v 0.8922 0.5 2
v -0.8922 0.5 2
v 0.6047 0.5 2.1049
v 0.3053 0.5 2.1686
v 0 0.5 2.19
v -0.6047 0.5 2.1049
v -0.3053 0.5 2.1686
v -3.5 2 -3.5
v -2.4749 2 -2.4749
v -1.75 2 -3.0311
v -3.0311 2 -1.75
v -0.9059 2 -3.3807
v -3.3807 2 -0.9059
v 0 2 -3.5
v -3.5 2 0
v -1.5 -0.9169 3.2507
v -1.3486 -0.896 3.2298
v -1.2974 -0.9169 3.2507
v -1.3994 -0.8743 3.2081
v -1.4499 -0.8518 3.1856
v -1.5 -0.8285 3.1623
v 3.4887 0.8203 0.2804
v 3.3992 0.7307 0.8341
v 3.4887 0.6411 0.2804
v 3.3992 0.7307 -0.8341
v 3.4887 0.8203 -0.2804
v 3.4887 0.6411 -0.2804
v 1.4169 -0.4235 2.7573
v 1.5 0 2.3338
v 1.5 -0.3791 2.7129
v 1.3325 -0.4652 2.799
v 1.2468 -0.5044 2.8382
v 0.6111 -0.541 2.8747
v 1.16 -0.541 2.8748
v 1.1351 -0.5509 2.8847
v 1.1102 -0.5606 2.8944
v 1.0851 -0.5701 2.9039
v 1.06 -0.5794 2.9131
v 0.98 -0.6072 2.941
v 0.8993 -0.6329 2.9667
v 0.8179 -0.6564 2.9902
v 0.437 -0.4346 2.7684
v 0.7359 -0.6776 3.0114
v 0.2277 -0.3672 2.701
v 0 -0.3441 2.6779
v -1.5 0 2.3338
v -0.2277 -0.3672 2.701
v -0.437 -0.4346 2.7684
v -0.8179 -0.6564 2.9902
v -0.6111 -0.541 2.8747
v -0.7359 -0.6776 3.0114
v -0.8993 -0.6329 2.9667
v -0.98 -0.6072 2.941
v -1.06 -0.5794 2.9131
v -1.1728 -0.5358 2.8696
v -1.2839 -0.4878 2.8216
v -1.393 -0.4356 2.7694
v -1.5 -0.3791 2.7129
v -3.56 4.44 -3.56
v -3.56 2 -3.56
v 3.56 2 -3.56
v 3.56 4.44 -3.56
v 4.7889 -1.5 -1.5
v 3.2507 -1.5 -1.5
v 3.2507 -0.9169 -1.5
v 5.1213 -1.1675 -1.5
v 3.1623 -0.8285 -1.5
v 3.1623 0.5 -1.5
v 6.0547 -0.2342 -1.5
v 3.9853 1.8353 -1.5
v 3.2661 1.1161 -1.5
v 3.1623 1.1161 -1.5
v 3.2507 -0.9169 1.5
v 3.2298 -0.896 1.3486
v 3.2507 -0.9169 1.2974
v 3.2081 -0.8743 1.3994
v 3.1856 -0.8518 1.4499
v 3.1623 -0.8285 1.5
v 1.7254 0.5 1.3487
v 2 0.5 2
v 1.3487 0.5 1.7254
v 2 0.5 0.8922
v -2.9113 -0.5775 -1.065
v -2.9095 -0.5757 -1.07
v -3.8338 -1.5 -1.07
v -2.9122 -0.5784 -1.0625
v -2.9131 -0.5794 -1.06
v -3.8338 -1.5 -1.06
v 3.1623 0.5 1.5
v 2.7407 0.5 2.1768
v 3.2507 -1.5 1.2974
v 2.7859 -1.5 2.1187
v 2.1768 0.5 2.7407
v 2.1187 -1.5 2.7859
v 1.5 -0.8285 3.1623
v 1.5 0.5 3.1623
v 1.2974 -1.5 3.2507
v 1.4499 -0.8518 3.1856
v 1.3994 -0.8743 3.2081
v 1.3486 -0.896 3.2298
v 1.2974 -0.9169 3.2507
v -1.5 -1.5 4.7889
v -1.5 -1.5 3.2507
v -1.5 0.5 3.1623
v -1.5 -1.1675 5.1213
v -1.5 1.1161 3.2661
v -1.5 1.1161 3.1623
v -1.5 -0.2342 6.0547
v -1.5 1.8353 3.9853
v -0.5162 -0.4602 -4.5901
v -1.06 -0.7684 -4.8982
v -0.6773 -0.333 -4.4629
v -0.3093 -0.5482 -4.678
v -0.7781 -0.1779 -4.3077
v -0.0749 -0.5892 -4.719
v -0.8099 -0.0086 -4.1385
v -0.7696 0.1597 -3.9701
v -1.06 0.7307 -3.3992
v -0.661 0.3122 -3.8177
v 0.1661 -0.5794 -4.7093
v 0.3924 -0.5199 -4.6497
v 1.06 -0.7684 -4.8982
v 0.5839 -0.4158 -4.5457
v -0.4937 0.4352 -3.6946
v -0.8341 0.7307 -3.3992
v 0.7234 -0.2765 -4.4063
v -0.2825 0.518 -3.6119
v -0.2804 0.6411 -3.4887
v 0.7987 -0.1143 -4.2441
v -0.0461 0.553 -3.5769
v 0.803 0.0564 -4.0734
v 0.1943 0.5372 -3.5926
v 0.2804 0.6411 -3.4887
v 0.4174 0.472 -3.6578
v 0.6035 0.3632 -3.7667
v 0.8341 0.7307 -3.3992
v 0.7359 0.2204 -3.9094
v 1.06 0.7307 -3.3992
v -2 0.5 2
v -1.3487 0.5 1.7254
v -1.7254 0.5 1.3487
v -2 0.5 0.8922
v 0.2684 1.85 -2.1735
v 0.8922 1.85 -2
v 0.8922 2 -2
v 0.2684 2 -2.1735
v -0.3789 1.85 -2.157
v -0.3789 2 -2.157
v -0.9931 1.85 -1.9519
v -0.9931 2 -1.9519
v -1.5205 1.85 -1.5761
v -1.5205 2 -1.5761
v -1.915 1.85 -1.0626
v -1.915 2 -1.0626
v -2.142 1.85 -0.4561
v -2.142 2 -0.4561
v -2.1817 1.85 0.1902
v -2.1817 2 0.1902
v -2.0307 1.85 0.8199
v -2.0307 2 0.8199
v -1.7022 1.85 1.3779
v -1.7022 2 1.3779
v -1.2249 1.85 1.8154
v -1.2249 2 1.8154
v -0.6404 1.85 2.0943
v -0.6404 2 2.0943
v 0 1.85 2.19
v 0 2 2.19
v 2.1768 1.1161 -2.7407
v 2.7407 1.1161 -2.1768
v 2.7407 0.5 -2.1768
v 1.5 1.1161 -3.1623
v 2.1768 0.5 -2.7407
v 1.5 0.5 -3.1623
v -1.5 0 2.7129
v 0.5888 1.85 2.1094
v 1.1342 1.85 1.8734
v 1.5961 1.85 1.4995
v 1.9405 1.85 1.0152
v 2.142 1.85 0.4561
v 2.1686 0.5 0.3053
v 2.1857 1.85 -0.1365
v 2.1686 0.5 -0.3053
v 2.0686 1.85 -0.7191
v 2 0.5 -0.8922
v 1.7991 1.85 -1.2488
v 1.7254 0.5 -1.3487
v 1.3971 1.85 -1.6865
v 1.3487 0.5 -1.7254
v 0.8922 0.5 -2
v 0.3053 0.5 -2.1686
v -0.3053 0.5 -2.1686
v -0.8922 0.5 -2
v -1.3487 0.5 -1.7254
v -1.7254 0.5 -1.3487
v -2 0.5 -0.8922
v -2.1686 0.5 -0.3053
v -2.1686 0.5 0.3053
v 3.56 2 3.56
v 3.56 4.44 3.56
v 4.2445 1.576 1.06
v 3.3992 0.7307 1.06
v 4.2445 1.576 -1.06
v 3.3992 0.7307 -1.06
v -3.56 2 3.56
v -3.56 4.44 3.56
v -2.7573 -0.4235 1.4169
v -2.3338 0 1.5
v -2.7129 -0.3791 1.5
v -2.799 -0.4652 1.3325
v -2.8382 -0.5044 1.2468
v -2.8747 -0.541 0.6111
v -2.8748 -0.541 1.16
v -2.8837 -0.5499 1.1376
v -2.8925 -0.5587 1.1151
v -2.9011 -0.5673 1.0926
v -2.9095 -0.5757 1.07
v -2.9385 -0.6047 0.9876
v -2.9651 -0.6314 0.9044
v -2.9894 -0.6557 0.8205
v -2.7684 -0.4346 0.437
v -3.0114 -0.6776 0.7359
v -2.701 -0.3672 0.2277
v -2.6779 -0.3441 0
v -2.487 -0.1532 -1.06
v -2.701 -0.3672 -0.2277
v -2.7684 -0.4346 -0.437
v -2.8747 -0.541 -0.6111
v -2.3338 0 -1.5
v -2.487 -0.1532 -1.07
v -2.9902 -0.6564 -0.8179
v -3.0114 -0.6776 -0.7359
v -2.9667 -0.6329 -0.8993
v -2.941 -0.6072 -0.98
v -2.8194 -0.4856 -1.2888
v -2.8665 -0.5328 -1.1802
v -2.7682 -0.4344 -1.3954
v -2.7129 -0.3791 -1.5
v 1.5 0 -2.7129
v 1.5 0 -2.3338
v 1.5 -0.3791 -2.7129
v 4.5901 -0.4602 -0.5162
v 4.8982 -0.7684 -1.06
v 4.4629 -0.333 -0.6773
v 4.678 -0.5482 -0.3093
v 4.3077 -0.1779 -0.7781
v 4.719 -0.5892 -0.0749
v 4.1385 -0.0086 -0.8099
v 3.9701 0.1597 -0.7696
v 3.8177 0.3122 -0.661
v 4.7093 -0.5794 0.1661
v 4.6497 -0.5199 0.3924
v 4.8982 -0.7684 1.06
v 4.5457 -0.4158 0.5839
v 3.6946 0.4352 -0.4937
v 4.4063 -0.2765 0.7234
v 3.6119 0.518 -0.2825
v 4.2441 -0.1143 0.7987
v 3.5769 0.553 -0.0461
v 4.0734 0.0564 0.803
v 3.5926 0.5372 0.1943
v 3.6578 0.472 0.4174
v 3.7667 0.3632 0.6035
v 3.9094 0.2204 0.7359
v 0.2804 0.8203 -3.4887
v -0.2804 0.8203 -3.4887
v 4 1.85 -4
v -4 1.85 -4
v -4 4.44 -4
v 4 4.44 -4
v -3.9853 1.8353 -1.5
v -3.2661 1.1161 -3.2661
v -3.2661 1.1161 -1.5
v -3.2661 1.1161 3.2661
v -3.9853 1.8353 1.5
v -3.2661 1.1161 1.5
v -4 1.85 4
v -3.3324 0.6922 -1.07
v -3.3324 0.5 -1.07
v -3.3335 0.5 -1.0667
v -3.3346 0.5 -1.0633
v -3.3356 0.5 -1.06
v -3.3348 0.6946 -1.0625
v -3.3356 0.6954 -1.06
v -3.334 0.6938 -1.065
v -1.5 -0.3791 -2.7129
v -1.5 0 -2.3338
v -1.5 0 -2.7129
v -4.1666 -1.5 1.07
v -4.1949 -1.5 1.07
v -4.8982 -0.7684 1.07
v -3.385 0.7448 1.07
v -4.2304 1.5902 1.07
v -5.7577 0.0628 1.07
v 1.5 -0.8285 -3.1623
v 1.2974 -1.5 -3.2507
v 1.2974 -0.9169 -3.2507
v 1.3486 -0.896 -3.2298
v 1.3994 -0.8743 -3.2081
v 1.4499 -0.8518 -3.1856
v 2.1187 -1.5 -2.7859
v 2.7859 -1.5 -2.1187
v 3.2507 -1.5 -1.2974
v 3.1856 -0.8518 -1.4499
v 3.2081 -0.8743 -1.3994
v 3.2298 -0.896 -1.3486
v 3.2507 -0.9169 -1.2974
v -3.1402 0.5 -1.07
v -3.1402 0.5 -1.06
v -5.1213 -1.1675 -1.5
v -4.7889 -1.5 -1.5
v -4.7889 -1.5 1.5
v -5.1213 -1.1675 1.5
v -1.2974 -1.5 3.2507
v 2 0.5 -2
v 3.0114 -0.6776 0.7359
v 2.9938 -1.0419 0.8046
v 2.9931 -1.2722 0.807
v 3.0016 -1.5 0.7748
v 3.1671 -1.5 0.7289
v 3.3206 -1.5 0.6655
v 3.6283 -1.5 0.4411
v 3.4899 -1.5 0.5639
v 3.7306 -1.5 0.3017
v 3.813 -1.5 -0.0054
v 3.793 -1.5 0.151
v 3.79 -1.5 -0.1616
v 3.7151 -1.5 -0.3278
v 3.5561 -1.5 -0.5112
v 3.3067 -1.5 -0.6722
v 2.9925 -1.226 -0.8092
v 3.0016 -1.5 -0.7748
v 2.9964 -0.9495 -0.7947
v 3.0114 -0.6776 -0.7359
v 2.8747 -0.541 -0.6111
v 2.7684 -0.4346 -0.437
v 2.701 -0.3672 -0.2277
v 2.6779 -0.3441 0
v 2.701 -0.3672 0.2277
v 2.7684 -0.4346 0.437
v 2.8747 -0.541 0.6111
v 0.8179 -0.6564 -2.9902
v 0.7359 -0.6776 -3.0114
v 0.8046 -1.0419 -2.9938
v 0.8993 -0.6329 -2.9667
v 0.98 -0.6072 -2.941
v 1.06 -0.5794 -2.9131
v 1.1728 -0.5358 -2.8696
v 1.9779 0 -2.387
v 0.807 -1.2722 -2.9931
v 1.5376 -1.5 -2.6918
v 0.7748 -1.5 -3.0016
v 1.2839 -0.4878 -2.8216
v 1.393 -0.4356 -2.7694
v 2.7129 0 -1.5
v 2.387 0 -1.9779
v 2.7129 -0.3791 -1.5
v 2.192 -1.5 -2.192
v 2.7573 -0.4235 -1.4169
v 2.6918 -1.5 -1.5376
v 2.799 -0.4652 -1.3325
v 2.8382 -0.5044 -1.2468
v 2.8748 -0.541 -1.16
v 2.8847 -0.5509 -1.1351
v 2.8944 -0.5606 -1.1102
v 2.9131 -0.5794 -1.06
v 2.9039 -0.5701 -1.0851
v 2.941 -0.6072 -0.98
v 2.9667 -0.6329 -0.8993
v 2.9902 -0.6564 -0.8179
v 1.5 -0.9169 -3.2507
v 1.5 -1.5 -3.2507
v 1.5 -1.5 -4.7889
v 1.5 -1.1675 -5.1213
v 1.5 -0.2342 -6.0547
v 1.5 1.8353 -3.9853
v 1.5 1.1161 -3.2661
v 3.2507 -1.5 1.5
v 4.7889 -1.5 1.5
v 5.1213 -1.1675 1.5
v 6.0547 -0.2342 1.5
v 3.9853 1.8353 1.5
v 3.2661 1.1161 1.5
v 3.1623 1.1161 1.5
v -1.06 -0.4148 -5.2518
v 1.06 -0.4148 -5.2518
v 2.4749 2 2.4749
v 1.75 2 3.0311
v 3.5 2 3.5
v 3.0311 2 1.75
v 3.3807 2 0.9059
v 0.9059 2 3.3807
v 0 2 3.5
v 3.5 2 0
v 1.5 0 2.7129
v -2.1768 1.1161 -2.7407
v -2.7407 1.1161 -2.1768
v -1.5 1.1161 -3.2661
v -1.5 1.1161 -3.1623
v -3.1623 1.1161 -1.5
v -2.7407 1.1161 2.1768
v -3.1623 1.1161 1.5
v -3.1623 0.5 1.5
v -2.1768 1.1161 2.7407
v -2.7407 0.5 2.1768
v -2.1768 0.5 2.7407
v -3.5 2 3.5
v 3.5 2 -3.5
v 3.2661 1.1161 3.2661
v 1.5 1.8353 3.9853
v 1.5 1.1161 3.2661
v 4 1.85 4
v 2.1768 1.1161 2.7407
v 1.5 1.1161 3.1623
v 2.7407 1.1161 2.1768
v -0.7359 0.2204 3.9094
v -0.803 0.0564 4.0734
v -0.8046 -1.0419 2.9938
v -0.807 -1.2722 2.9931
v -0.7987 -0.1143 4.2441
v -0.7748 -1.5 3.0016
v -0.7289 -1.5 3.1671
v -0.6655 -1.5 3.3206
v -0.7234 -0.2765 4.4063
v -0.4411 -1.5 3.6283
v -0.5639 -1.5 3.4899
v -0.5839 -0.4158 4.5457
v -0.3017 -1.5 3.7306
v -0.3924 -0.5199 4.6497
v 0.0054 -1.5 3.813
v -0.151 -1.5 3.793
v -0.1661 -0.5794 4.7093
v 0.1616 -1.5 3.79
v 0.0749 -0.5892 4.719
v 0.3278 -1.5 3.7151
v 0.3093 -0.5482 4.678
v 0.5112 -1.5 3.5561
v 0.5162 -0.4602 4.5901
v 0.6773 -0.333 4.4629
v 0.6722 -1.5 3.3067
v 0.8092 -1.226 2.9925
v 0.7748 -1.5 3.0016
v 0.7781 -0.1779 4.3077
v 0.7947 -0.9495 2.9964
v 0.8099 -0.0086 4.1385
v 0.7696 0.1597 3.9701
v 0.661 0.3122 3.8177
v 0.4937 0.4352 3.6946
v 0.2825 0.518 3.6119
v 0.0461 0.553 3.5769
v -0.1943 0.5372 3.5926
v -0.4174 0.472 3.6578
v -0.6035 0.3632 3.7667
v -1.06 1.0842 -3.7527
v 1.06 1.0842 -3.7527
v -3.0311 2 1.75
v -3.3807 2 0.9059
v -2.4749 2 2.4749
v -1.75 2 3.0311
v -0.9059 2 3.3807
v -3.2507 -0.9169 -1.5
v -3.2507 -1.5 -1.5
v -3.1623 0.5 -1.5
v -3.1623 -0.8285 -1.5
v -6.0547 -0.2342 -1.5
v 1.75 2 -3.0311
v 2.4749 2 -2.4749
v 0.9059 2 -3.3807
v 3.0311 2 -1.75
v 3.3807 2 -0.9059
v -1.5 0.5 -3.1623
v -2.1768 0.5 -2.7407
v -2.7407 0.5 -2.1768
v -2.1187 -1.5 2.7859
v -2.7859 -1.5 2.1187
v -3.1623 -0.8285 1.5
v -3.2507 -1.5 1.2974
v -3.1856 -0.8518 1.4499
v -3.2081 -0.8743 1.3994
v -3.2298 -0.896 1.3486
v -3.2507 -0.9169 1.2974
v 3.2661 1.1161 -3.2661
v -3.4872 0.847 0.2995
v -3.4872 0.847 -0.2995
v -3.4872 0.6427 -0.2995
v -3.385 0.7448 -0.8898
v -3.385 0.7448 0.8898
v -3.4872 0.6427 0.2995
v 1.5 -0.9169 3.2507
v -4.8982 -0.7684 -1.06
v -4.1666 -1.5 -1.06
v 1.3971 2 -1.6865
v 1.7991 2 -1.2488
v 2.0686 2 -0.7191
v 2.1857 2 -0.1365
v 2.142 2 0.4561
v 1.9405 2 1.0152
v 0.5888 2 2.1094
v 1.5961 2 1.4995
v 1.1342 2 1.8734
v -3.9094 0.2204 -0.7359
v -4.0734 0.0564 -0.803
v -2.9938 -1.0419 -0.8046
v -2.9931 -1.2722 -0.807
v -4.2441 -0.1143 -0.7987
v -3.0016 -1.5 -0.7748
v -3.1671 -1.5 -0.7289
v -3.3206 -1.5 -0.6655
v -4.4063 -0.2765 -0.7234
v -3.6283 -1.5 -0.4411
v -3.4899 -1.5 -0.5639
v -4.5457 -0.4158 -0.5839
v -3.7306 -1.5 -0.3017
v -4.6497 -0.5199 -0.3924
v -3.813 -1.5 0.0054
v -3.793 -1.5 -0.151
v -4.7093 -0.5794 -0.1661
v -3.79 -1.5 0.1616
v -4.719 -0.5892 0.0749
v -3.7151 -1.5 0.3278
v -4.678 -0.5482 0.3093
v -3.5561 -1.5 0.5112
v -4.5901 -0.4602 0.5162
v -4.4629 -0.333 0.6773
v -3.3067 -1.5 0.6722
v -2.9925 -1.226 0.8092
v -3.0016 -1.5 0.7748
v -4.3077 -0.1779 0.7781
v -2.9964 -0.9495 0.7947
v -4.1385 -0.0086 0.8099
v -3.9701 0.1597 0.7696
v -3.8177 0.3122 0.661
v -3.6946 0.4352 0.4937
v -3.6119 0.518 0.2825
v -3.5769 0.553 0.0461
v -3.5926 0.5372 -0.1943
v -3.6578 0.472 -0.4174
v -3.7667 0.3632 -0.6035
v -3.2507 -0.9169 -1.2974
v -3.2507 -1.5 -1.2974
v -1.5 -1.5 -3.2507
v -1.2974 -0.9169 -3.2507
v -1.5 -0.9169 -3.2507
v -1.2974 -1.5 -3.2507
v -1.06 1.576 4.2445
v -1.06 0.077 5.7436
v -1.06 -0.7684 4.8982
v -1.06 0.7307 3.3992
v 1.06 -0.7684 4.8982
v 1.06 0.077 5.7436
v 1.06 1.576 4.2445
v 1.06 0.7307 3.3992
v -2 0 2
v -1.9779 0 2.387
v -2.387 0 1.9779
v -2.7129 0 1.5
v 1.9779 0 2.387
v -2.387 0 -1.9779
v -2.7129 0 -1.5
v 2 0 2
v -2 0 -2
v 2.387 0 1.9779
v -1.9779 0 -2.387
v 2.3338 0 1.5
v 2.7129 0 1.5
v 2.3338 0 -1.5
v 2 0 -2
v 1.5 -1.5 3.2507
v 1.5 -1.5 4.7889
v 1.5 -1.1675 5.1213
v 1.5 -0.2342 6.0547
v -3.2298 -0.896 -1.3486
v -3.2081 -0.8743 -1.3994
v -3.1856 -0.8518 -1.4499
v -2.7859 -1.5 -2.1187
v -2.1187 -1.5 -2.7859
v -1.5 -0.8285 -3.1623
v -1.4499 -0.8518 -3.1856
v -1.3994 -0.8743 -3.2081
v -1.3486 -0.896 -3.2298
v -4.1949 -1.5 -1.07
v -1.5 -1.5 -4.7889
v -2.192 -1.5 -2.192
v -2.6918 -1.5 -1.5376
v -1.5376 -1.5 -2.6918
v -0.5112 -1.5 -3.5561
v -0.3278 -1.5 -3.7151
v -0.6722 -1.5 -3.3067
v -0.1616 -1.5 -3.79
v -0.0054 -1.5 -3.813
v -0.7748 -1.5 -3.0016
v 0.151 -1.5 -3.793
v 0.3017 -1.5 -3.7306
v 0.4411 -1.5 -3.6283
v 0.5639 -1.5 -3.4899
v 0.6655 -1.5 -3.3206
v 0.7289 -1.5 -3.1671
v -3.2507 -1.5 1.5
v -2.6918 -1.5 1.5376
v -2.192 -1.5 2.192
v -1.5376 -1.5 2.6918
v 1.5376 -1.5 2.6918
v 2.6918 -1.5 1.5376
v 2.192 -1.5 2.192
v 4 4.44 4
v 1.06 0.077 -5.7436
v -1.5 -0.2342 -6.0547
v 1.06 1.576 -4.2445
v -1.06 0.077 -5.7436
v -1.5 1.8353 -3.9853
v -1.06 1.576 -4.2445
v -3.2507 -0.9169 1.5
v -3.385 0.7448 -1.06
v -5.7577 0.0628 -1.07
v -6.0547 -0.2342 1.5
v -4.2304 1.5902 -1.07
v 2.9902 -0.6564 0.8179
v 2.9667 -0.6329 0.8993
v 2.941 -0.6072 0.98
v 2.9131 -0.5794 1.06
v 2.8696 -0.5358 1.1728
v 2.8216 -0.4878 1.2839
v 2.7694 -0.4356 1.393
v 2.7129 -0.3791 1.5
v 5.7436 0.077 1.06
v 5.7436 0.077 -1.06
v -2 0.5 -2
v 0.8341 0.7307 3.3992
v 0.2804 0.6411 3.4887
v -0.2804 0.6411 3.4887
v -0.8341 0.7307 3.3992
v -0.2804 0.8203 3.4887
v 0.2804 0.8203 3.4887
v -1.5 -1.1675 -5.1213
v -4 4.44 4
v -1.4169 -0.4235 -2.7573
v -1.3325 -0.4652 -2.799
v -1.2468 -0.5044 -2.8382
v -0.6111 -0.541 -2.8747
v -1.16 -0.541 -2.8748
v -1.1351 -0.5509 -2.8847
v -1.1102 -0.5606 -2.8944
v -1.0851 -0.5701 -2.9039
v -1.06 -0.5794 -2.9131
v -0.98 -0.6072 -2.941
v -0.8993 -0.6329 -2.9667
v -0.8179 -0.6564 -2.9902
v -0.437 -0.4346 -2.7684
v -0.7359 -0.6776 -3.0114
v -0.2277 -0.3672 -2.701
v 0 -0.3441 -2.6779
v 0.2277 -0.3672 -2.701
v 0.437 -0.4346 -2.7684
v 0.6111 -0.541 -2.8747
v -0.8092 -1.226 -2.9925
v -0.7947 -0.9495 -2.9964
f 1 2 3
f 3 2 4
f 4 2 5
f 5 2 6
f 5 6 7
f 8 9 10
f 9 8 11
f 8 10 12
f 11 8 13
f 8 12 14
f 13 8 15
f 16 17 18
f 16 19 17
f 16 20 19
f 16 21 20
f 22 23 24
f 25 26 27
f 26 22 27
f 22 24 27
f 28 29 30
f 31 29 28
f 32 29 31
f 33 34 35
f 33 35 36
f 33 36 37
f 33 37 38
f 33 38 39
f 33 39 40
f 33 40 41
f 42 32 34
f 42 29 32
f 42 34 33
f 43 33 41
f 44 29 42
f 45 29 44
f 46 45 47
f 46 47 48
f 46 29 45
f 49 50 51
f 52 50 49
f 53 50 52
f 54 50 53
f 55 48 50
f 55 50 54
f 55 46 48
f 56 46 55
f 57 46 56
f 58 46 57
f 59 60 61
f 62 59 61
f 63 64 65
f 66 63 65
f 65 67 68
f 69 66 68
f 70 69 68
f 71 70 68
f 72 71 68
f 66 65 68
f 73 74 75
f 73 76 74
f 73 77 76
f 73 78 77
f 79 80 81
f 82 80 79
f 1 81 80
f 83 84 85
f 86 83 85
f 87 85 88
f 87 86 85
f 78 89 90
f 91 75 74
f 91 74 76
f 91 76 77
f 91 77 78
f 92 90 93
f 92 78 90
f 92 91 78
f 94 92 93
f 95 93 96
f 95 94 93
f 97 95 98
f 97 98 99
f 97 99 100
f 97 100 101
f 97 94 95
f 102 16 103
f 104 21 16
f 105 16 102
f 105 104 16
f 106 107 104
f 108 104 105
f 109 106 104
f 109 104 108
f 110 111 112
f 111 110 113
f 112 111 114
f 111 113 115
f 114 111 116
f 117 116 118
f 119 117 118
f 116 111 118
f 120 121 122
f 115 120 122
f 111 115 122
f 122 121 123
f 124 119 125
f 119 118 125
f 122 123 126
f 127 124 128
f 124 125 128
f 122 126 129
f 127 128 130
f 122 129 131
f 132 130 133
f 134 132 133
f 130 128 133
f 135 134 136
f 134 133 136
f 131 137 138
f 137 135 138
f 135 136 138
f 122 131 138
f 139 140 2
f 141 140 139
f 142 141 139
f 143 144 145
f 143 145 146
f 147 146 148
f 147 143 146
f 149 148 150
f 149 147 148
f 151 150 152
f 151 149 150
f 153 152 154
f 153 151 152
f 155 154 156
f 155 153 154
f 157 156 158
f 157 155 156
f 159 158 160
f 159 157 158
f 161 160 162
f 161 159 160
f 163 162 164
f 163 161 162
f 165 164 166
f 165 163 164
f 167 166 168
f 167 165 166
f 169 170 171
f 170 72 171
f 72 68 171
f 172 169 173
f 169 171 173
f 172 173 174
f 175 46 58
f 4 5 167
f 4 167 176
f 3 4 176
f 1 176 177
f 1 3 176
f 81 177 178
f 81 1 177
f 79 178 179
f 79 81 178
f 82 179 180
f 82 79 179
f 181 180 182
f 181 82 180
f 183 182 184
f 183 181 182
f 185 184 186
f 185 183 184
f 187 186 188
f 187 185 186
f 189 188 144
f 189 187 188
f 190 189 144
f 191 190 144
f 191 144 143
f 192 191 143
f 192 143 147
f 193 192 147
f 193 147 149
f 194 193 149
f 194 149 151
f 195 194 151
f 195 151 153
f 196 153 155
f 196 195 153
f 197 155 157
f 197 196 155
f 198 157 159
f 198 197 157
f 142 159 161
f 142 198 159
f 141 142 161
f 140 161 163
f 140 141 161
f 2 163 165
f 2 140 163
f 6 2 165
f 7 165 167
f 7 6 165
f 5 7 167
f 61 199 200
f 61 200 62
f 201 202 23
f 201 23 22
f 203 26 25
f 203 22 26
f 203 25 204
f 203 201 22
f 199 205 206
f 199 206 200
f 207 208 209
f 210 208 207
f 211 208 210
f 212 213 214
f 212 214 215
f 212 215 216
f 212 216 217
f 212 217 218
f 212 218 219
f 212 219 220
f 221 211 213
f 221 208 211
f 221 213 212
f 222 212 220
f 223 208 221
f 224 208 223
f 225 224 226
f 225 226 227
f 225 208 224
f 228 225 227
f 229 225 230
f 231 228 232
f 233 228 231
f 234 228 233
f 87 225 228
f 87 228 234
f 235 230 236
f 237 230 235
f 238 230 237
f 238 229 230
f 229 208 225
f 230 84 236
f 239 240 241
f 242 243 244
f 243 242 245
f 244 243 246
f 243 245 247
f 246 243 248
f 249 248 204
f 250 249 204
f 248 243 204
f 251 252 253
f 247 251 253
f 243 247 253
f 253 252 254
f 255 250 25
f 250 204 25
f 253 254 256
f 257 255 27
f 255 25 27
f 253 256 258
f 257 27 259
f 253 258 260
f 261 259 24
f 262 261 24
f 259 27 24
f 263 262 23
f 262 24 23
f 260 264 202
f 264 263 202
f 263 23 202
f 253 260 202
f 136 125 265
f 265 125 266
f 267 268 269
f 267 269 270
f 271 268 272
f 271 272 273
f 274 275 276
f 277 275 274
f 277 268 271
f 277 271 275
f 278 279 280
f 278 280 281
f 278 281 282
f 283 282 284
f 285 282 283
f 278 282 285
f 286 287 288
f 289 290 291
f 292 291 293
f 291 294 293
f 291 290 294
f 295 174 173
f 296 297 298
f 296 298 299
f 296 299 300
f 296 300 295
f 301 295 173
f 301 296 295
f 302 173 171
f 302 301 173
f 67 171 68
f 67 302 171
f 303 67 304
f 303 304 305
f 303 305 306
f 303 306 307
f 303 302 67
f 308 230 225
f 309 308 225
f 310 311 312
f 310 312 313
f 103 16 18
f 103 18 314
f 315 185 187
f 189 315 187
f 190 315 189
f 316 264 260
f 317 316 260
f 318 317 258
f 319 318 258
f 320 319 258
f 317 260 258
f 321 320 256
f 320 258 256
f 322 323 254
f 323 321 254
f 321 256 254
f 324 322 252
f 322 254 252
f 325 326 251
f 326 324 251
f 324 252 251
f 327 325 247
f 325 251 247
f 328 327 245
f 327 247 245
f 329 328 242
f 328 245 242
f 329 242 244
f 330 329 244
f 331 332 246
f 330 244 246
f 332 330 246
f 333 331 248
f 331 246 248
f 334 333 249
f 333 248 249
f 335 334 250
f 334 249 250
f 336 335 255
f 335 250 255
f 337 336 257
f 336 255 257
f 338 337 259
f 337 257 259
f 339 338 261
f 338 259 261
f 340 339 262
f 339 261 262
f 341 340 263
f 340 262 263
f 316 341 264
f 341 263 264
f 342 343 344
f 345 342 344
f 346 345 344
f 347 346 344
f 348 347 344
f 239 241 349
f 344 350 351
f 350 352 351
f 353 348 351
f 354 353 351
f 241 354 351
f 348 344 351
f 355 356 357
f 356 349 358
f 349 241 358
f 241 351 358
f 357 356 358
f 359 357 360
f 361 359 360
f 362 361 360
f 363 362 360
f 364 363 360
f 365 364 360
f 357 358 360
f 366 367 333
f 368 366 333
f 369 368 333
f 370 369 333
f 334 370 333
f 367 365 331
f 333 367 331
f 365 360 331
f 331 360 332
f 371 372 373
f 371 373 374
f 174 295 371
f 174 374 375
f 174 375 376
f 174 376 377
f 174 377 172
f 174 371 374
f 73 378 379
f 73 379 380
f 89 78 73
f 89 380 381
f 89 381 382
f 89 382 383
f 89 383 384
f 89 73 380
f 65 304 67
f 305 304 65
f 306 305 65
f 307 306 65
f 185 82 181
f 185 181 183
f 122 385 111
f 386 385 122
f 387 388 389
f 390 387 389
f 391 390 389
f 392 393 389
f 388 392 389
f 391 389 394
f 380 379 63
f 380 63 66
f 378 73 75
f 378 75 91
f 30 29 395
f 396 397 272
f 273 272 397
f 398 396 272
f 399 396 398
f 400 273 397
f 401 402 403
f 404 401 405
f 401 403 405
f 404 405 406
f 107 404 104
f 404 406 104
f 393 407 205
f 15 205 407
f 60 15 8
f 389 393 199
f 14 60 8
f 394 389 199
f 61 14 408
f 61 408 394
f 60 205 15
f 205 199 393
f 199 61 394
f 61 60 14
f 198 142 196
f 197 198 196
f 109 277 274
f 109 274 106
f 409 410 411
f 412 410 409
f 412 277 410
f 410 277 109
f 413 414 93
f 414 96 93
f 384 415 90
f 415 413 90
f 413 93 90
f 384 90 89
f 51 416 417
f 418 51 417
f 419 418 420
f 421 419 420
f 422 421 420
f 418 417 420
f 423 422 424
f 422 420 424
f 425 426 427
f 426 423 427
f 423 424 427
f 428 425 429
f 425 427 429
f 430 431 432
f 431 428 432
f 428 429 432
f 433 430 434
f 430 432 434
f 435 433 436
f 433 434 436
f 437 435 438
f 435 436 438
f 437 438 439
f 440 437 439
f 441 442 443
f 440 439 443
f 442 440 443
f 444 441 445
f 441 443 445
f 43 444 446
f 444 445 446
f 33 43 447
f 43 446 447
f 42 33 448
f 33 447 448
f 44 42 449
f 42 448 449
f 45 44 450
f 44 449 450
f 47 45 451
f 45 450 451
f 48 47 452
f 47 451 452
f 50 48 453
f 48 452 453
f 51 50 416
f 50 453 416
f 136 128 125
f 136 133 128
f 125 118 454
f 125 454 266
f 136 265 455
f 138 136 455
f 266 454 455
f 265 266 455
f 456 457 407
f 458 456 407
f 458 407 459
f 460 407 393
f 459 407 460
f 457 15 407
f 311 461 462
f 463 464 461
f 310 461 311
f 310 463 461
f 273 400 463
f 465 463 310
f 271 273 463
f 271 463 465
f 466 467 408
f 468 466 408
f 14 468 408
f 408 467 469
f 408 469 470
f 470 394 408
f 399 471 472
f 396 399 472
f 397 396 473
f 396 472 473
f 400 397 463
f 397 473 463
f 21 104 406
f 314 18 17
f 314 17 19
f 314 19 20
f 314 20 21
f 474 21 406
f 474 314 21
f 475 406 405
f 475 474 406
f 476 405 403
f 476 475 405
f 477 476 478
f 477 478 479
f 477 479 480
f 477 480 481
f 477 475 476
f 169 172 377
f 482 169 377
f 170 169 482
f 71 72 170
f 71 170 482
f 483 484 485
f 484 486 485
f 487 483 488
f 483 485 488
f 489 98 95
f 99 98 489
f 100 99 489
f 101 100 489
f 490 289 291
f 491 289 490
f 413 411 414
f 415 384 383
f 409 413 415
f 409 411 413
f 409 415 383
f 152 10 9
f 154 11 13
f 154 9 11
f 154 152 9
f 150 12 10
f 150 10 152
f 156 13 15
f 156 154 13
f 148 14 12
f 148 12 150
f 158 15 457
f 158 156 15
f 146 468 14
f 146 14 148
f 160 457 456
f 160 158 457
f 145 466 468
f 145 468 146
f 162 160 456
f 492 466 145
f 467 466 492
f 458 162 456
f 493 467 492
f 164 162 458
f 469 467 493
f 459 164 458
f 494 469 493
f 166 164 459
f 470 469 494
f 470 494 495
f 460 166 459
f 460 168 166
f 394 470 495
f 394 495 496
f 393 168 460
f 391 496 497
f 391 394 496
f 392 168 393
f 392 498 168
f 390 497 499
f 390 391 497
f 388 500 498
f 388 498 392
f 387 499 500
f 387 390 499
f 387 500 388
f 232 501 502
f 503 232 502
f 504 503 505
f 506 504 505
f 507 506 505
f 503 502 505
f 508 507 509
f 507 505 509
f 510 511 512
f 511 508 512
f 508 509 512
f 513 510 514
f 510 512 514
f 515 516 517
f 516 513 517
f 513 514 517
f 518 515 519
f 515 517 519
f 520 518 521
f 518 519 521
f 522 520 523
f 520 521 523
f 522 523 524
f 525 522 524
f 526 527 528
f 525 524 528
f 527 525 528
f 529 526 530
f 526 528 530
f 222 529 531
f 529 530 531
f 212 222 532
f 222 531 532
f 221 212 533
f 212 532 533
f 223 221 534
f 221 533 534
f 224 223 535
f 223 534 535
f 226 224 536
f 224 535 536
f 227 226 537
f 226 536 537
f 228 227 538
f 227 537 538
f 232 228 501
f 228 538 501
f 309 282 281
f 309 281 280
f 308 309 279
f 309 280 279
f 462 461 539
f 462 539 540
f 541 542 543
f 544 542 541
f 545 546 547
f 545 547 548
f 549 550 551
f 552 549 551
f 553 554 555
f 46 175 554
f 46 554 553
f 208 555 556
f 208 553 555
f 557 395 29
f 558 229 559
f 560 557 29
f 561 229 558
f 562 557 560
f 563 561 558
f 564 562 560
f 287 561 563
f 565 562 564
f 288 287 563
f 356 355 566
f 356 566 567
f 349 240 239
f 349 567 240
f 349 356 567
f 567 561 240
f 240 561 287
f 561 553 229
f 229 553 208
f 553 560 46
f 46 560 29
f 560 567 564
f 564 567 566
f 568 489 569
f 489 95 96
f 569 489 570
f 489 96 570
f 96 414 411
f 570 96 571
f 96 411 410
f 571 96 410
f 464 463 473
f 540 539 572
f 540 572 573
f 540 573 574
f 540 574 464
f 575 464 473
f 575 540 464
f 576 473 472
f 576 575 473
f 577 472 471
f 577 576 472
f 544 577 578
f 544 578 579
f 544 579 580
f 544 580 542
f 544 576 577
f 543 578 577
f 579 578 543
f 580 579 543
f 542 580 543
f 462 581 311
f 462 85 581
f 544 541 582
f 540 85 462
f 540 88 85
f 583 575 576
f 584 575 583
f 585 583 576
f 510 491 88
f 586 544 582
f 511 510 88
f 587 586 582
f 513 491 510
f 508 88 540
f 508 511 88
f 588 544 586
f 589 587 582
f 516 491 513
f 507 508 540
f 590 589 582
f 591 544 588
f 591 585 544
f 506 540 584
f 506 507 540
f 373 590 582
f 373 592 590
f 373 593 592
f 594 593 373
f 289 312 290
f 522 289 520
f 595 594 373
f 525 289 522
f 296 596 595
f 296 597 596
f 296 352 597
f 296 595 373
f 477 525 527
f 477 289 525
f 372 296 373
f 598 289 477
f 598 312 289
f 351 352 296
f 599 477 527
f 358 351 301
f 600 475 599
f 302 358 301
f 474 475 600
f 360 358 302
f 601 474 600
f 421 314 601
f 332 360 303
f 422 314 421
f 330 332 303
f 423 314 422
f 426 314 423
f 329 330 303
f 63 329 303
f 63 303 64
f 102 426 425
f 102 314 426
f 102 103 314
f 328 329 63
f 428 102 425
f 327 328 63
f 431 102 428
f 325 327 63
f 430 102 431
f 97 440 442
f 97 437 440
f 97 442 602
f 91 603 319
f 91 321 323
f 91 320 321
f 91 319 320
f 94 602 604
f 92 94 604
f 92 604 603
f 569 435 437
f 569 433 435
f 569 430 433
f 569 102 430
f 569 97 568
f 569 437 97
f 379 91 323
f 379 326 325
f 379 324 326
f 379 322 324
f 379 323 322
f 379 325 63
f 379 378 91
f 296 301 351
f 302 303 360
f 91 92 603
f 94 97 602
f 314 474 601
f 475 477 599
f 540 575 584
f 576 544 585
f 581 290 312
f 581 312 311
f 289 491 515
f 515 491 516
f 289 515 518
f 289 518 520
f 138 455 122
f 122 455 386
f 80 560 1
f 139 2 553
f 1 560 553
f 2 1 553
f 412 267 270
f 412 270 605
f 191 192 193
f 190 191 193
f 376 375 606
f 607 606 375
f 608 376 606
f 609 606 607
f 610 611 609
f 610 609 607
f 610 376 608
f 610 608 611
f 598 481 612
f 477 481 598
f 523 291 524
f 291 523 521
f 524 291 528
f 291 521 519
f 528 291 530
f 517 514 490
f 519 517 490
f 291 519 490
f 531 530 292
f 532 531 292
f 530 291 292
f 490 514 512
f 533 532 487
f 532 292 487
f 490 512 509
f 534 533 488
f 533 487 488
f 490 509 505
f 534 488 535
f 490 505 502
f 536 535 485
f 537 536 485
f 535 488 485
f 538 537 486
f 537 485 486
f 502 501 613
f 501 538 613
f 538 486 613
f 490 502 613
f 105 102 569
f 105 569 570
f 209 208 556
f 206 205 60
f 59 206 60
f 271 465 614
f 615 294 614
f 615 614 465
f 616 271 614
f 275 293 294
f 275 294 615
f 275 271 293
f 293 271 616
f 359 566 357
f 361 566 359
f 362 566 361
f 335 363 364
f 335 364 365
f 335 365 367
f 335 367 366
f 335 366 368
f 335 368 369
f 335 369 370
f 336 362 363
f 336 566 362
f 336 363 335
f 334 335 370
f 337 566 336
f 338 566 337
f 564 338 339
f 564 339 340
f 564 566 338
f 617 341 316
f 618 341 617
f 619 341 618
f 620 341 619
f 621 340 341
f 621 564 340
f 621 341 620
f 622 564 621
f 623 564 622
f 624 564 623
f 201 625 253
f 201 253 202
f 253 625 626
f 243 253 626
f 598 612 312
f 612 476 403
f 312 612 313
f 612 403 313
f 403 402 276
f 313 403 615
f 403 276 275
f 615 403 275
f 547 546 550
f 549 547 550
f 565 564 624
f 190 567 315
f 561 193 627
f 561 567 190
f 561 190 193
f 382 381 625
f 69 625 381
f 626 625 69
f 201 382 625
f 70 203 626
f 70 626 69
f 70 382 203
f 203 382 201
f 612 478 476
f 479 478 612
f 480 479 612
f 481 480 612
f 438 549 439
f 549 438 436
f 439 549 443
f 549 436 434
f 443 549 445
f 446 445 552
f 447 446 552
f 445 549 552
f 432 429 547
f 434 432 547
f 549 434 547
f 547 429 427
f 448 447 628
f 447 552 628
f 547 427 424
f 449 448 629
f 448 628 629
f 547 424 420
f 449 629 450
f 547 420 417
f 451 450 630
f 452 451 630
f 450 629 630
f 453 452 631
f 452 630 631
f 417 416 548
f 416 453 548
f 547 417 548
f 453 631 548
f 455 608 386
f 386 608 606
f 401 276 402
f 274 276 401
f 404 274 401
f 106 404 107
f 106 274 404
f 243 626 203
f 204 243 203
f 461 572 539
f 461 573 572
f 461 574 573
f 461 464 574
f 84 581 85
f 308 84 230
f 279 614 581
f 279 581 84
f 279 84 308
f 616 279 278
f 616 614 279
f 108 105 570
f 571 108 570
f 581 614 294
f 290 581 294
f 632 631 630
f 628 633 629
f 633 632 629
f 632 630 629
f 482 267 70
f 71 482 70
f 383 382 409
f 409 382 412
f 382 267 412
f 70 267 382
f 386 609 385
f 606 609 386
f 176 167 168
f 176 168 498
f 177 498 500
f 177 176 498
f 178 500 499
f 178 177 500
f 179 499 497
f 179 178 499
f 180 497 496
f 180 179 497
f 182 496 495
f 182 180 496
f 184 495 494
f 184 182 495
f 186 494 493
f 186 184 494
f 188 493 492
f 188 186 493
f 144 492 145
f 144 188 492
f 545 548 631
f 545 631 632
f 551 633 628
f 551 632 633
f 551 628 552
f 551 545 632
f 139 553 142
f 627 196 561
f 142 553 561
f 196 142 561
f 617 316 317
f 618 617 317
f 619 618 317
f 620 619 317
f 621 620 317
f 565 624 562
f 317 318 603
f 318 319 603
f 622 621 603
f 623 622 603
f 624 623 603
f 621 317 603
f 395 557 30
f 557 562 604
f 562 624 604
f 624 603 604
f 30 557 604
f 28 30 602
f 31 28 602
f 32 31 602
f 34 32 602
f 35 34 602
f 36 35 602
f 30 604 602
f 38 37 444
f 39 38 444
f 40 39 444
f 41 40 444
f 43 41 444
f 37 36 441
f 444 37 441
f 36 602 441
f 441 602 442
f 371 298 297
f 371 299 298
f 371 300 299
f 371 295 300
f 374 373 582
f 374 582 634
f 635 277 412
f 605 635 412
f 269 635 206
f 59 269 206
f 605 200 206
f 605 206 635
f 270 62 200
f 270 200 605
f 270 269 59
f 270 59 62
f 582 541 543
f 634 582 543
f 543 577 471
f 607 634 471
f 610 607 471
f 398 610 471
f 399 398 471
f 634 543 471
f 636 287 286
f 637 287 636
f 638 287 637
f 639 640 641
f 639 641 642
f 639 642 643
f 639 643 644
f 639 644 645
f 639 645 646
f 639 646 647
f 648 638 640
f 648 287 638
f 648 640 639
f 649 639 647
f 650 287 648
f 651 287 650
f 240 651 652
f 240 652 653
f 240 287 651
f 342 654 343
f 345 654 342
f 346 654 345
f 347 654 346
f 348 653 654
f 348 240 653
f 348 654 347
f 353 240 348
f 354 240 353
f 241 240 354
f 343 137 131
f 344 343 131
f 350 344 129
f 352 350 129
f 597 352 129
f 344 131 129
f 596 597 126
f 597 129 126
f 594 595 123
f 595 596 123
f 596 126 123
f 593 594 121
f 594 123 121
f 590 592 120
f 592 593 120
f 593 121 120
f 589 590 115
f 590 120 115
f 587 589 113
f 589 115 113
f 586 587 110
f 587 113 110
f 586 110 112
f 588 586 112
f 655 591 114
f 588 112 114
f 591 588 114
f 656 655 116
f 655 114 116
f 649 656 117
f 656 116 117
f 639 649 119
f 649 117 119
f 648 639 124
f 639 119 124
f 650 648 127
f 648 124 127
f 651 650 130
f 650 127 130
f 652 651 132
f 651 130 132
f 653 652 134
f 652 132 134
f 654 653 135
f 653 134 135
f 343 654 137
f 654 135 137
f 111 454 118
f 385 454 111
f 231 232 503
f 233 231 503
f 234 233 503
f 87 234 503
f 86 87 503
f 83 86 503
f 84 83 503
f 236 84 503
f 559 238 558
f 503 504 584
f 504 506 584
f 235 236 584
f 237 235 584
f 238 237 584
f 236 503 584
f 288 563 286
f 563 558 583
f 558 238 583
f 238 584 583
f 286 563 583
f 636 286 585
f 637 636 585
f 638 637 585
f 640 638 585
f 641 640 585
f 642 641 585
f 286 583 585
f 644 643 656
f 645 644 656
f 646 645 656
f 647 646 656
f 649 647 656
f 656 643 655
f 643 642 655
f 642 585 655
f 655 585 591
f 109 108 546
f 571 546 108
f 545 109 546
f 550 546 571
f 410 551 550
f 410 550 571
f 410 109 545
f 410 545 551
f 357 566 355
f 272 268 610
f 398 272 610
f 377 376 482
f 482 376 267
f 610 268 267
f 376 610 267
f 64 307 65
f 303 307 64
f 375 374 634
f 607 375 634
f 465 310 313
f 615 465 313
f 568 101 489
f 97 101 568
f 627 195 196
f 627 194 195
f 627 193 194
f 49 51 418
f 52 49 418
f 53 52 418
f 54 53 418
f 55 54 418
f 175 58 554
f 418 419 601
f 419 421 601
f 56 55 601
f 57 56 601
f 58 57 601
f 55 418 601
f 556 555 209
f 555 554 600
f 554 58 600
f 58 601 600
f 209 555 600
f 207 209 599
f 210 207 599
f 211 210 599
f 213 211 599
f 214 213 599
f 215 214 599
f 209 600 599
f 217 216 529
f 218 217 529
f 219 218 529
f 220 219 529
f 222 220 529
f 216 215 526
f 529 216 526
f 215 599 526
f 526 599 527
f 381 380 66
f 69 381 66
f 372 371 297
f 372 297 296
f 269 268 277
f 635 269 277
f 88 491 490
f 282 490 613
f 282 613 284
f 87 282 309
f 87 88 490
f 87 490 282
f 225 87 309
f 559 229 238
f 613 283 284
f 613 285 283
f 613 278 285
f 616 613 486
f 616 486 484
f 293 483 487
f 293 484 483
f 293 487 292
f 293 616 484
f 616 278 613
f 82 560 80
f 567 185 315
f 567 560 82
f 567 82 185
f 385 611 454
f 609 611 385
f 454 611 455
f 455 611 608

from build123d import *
from build123d.topology import SkipClean

# Parameters (mm, degrees)
SKETCH6_R            = 3
SKETCH6_R_2          = 2.19
BOSS_EXTRUDE3_DEPTH  = 2
SKETCH7_W            = 4
SKETCH7_H            = 4
CUT_EXTRUDE2_DEPTH   = 0.5
BOSS_EXTRUDE5_START  = 0.5
BOSS_EXTRUDE5_DEPTH  = 0.5
SKETCH17_R           = 3.5
SKETCH17_R_2         = 3
BOSS_EXTRUDE11_DEPTH = 0.5
BOSS_EXTRUDE12_START = 2
SKETCH18_R           = 3.5
SKETCH18_R_2         = 3.1
BOSS_EXTRUDE12_DEPTH = 2
BOSS_EXTRUDE13_DEPTH = 1.5
SKETCH29_W           = 3
SKETCH29_H           = 3
BOSS_EXTRUDE16_DEPTH = 1.5
SKETCH30_W           = 2.12
SKETCH30_H           = 2.12
CUT_EXTRUDE10_DEPTH  = 2.645512986
SKETCH31_W           = 2.22
SKETCH31_H           = 2.22
BOSS_EXTRUDE17_DEPTH = 1.27
SKETCH32_R           = 0.81
CUT_EXTRUDE11_DEPTH  = 8.729286762
SKETCH33_W           = 3.2
SKETCH33_H           = 3.2
CUT_EXTRUDE12_DEPTH  = 0.18
CIRPATTERN3_COUNT    = 4
SKETCH34_W           = 2.14
SKETCH34_H           = 2.16
CUT_EXTRUDE13_DEPTH  = 2.645512986
SKETCH35_W           = 2.12
SKETCH35_H           = 2.12
CUT_EXTRUDE14_DEPTH  = 2.645512986
SKETCH36_W           = 2.12
SKETCH36_H           = 2.12
CUT_EXTRUDE15_DEPTH  = 2.645512986
CIRPATTERN16_COUNT   = 4
SKETCH37_R           = 10
CUT_EXTRUDE17_DEPTH  = 0.5
SKETCH38_R           = 3.5
SKETCH38_R_2         = 2.85
BOSS_EXTRUDE18_DEPTH = 1.5
SKETCH39_W           = 2.12
SKETCH39_H           = 2.12
CUT_EXTRUDE18_DEPTH  = 0.5
SKETCH40_W           = 8
SKETCH40_H           = 8
SKETCH40_W_2         = 7
SKETCH40_H_2         = 7
BOSS_EXTRUDE19_DEPTH = 2.44
BOSS_EXTRUDE20_START = 0.15
SKETCH41_W           = 8
SKETCH41_H           = 8
SKETCH41_R           = 2.19
BOSS_EXTRUDE20_DEPTH = 0.15
SKETCH42_W           = 8
SKETCH42_H           = 8
SKETCH42_R           = 2.19
BOSS_EXTRUDE21_DEPTH = 0.733937
BOSS_EXTRUDE21_DRAFT = 45
SKETCH43_W           = 7.12
SKETCH43_H           = 7.12
CUT_EXTRUDE19_DEPTH  = 10


with BuildPart() as part:
    # Sketch6 → Boss-Extrude3 (new body)
    with BuildSketch(Plane(origin=(0, 0, 0), x_dir=(1, 0, 0), z_dir=(0, 1, 0))):
        with Locations(Location((0, 0, 0), (0, 0, 270))):
            Circle(SKETCH6_R)
        with Locations(Location((0, 0, 0), (0, 0, 270))):
            Circle(SKETCH6_R_2, mode=Mode.SUBTRACT)
    extrude(amount=BOSS_EXTRUDE3_DEPTH)

    # Sketch7 → Cut-Extrude2 (cut)
    with BuildSketch(Plane(origin=(0, 0, 0), x_dir=(-1, 0, 0), z_dir=(0, -1, 0))):
        Rectangle(SKETCH7_W, SKETCH7_H)
    extrude(amount=-CUT_EXTRUDE2_DEPTH, mode=Mode.SUBTRACT)

    # Sketch8 → Boss-Extrude5 (add)
    with BuildSketch(Plane(origin=(0, 0.5, 0), x_dir=(-1, 0, 0), z_dir=(0, -1, 0)).offset(BOSS_EXTRUDE5_START)):
        with BuildLine():
            Line((-0.892244361, 2), (0.892244361, 2))
            ThreePointArc((0.892244361, 2), (0, 2.19), (-0.892244361, 2))
        make_face()
        with BuildLine():
            Line((-2, 0.892244361), (-2, -0.892244361))
            ThreePointArc((-2, -0.892244361), (-2.19, 0), (-2, 0.892244361))
        make_face()
        with BuildLine():
            Line((-0.892244361, -2), (0.892244361, -2))
            ThreePointArc((0.892244361, -2), (0, -2.19), (-0.892244361, -2))
        make_face()
        with BuildLine():
            Line((2, 0.892244361), (2, -0.892244361))
            ThreePointArc((2, -0.892244361), (2.19, 0), (2, 0.892244361))
        make_face()
    extrude(amount=-BOSS_EXTRUDE5_DEPTH)

    # Sketch17 → Boss-Extrude11 (add)
    with BuildSketch(Plane(origin=(0, 0, 0), x_dir=(-1, 0, 0), z_dir=(0, -1, 0))):
        with Locations(Location((0, 0, 0), (0, 0, 90))):
            Circle(SKETCH17_R)
        with Locations(Location((0, 0, 0), (0, 0, 90))):
            Circle(SKETCH17_R_2, mode=Mode.SUBTRACT)
    extrude(amount=-BOSS_EXTRUDE11_DEPTH)

    # Sketch18 → Boss-Extrude12 (add)
    with BuildSketch(Plane(origin=(0, 0, 0), x_dir=(-1, 0, 0), z_dir=(0, -1, 0)).offset(BOSS_EXTRUDE12_START)):
        with Locations(Location((0, 0, 0), (0, 0, 90))):
            Circle(SKETCH18_R)
        with Locations(Location((0, 0, 0), (0, 0, 90))):
            Circle(SKETCH18_R_2, mode=Mode.SUBTRACT)
    extrude(amount=-BOSS_EXTRUDE12_DEPTH)

    # Sketch19 → Boss-Extrude13 (add, symmetric)
    with BuildSketch(Plane.XY):
        Polygon((4.288855584, -2), (5.121320344, -1.167535241), (3, 0.953785103), (2.19, 0.143785103), (3.250660172, -0.916875069), (3.250660172, -2), (4.033756176, -2), align=None)
    boss_extrude13 = extrude(amount=BOSS_EXTRUDE13_DEPTH, both=True)

    # Sketch29 → Boss-Extrude16 (add)
    with BuildSketch(Plane(origin=(1.976892551, 1.976892551, 0), x_dir=(0, 0, -1), z_dir=(0.707106781186548, 0.7071067811865471, 0))):
        with Locations((0, -2.94689243)):
            Rectangle(SKETCH29_W, SKETCH29_H)
    boss_extrude16 = extrude(amount=BOSS_EXTRUDE16_DEPTH)

    # Sketch30 → Cut-Extrude10 (cut)
    with BuildSketch(Plane(origin=(3.037552723, 3.037552723, 0), x_dir=(0, 0, -1), z_dir=(0.707106781186548, 0.7071067811865471, 0))):
        with Locations((0, -2.94689243)):
            Rectangle(SKETCH30_W, SKETCH30_H)
    extrude(amount=-CUT_EXTRUDE10_DEPTH, mode=Mode.SUBTRACT)

    # Sketch31 → Boss-Extrude17 (add)
    with BuildSketch(Plane(origin=(1.166892551, 1.166892551, 0), x_dir=(0, 0, 1), z_dir=(-0.7071067811865441, -0.7071067811865509, 0))):
        with Locations((-0.05, -2.89689243)):
            Rectangle(SKETCH31_W, SKETCH31_H)
    boss_extrude17 = extrude(amount=-BOSS_EXTRUDE17_DEPTH)

    # Sketch32 → Cut-Extrude11 (cut, symmetric)
    with BuildSketch(Plane(origin=(2.064918163, 2.064918163, 0), x_dir=(0, 0, -1), z_dir=(0.7071067811865444, 0.7071067811865508, 0))):
        with Locations(Location((0, -2.94689243, 0), (0, 0, 155.306163656))):
            Circle(SKETCH32_R)
    cut_extrude11 = extrude(amount=CUT_EXTRUDE11_DEPTH, both=True, mode=Mode.SUBTRACT)

    # Sketch33 → Cut-Extrude12 (cut)
    with BuildSketch(Plane(origin=(3.037552723, 3.037552723, 0), x_dir=(0, 0, -1), z_dir=(0.707106781186548, 0.7071067811865471, 0))):
        with Locations((0, -2.94689243)):
            Rectangle(SKETCH33_W, SKETCH33_H)
    cut_extrude12 = extrude(amount=-CUT_EXTRUDE12_DEPTH, mode=Mode.SUBTRACT)

    # CirPattern3: Boss-Extrude13, Boss-Extrude16 ×4 about axis
    cirpattern3_axis = Axis((0, 0, 0), (0, 1, 0))
    add([boss_extrude13.rotate(cirpattern3_axis, i * 360 / CIRPATTERN3_COUNT) for i in range(1, CIRPATTERN3_COUNT)])
    add([boss_extrude16.rotate(cirpattern3_axis, i * 360 / CIRPATTERN3_COUNT) for i in range(1, CIRPATTERN3_COUNT)])

    # Sketch34 → Cut-Extrude13 (cut)
    with BuildSketch(Plane(origin=(-3.037552723, 3.037552723, 0), x_dir=(0, 0, 1), z_dir=(-0.707106781186548, 0.7071067811865471, 0))):
        with Locations((0, -2.94689243)):
            Rectangle(SKETCH34_W, SKETCH34_H)
    extrude(amount=-CUT_EXTRUDE13_DEPTH, mode=Mode.SUBTRACT)

    # Sketch35 → Cut-Extrude14 (cut)
    with BuildSketch(Plane(origin=(0, 3.037552723, -3.037552723), x_dir=(1, 0, 0), z_dir=(7.355440612690688e-15, 0.7071067811865471, -0.707106781186548))):
        with Locations((0, 2.94689243)):
            Rectangle(SKETCH35_W, SKETCH35_H)
    extrude(amount=-CUT_EXTRUDE14_DEPTH, mode=Mode.SUBTRACT)

    # Sketch36 → Cut-Extrude15 (cut)
    with BuildSketch(Plane(origin=(0, 3.037552723, 3.037552723), x_dir=(1, 0, 0), z_dir=(-2.417740350526155e-15, 0.7071067811865471, 0.707106781186548))):
        with Locations((0, -2.94689243)):
            Rectangle(SKETCH36_W, SKETCH36_H)
    extrude(amount=-CUT_EXTRUDE15_DEPTH, mode=Mode.SUBTRACT)

    # CirPattern16: Boss-Extrude17, Cut-Extrude11, Cut-Extrude12 ×4 about axis
    cirpattern16_axis = Axis((0, 0, 0), (0, 1, 0))
    add([boss_extrude17.rotate(cirpattern16_axis, i * 360 / CIRPATTERN16_COUNT) for i in range(1, CIRPATTERN16_COUNT)])
    add([cut_extrude11.rotate(cirpattern16_axis, i * 360 / CIRPATTERN16_COUNT) for i in range(1, CIRPATTERN16_COUNT)], mode=Mode.SUBTRACT)
    add([cut_extrude12.rotate(cirpattern16_axis, i * 360 / CIRPATTERN16_COUNT) for i in range(1, CIRPATTERN16_COUNT)], mode=Mode.SUBTRACT)

    # Sketch37 → Cut-Extrude17 (cut)
    with BuildSketch(Plane.XZ.offset(2)):
        Circle(SKETCH37_R)
    extrude(amount=-CUT_EXTRUDE17_DEPTH, mode=Mode.SUBTRACT)

    # Sketch38 → Boss-Extrude18 (add)
    with SkipClean():  # the faces are left unmerged after this step: merging them gives an invalid solid
        with BuildSketch(Plane(origin=(0, 0.5, 0), x_dir=(1, 0, 0), z_dir=(0, 1, 0))):
            with Locations(Location((0, 0, 0), (0, 0, 111.75765302))):
                Circle(SKETCH38_R)
            Circle(SKETCH38_R_2, mode=Mode.SUBTRACT)
        extrude(amount=BOSS_EXTRUDE18_DEPTH)
    add(part.part.scale(1), mode=Mode.REPLACE)  # the faces are merged on a copy

    # Sketch39 → Cut-Extrude18 (cut)
    with BuildSketch(Plane(origin=(0, 2.064918163, -2.064918163), x_dir=(1, 0, 0), z_dir=(-2.4688501310822543e-15, 0.7071067811865508, -0.7071067811865444))):
        with Locations((0, 2.94689243)):
            Rectangle(SKETCH39_W, SKETCH39_H)
    extrude(amount=CUT_EXTRUDE18_DEPTH, mode=Mode.SUBTRACT)



with BuildPart() as body_2:
    # Sketch40 → Boss-Extrude19 (new body)
    with BuildSketch(Plane(origin=(0, 2, 0), x_dir=(1, 0, 0), z_dir=(0, 1, 0))):
        Rectangle(SKETCH40_W, SKETCH40_H)
        Rectangle(SKETCH40_W_2, SKETCH40_H_2, mode=Mode.SUBTRACT)
    extrude(amount=BOSS_EXTRUDE19_DEPTH)


with BuildPart() as part_1:
    with SkipClean():  # the faces are left unmerged after this step: merging them gives an invalid solid
        add(part.part)

        add(body_2.part)  # Boss-Extrude20 merges body 2
        # Sketch41 → Boss-Extrude20 (add)
        with BuildSketch(Plane.XZ.offset(-2).offset(BOSS_EXTRUDE20_START)):
            Rectangle(SKETCH41_W, SKETCH41_H)
            with Locations(Location((0, 0, 0), (0, 0, 294.042710138))):
                Circle(SKETCH41_R, mode=Mode.SUBTRACT)
        extrude(amount=-BOSS_EXTRUDE20_DEPTH)


with BuildPart() as boss_extrude21_tool:
    # Sketch42 → Boss-Extrude21 (with draft: the straight prism first)
    with BuildSketch(Plane.XZ.offset(-1.85)):
        Rectangle(SKETCH42_W, SKETCH42_H)
        with Locations(Location((0, 0, 0), (0, 0, 294.042710138))):
            Circle(SKETCH42_R, mode=Mode.SUBTRACT)
    extrude(amount=BOSS_EXTRUDE21_DEPTH)
    # Boss-Extrude21: the draft: its side faces are tilted about the plane it starts from
    boss_extrude21_sides = [boss_extrude21_tool.faces().sort_by_distance(p)[0] for p in [
        (-4, 1.4830315, 0),
        (0, 1.4830315, -4),
        (4, 1.4830315, 0),
        (0, 1.4830315, 4),
        (-0.892244361, 1.4830315, 2),
    ]]
    draft(boss_extrude21_sides, Plane.XZ.offset(-1.85), BOSS_EXTRUDE21_DRAFT)


with BuildPart() as part_2:
    add(part_1.part)

    # Boss-Extrude21: add boss_extrude21_tool
    add(boss_extrude21_tool.part)

    # Sketch43 → Cut-Extrude19 (cut)
    with BuildSketch(Plane(origin=(0, 2, 0), x_dir=(1, 0, 0), z_dir=(0, 1, 0))):
        Rectangle(SKETCH43_W, SKETCH43_H)
    extrude(amount=CUT_EXTRUDE19_DEPTH, mode=Mode.SUBTRACT)


solid = part_2.part
